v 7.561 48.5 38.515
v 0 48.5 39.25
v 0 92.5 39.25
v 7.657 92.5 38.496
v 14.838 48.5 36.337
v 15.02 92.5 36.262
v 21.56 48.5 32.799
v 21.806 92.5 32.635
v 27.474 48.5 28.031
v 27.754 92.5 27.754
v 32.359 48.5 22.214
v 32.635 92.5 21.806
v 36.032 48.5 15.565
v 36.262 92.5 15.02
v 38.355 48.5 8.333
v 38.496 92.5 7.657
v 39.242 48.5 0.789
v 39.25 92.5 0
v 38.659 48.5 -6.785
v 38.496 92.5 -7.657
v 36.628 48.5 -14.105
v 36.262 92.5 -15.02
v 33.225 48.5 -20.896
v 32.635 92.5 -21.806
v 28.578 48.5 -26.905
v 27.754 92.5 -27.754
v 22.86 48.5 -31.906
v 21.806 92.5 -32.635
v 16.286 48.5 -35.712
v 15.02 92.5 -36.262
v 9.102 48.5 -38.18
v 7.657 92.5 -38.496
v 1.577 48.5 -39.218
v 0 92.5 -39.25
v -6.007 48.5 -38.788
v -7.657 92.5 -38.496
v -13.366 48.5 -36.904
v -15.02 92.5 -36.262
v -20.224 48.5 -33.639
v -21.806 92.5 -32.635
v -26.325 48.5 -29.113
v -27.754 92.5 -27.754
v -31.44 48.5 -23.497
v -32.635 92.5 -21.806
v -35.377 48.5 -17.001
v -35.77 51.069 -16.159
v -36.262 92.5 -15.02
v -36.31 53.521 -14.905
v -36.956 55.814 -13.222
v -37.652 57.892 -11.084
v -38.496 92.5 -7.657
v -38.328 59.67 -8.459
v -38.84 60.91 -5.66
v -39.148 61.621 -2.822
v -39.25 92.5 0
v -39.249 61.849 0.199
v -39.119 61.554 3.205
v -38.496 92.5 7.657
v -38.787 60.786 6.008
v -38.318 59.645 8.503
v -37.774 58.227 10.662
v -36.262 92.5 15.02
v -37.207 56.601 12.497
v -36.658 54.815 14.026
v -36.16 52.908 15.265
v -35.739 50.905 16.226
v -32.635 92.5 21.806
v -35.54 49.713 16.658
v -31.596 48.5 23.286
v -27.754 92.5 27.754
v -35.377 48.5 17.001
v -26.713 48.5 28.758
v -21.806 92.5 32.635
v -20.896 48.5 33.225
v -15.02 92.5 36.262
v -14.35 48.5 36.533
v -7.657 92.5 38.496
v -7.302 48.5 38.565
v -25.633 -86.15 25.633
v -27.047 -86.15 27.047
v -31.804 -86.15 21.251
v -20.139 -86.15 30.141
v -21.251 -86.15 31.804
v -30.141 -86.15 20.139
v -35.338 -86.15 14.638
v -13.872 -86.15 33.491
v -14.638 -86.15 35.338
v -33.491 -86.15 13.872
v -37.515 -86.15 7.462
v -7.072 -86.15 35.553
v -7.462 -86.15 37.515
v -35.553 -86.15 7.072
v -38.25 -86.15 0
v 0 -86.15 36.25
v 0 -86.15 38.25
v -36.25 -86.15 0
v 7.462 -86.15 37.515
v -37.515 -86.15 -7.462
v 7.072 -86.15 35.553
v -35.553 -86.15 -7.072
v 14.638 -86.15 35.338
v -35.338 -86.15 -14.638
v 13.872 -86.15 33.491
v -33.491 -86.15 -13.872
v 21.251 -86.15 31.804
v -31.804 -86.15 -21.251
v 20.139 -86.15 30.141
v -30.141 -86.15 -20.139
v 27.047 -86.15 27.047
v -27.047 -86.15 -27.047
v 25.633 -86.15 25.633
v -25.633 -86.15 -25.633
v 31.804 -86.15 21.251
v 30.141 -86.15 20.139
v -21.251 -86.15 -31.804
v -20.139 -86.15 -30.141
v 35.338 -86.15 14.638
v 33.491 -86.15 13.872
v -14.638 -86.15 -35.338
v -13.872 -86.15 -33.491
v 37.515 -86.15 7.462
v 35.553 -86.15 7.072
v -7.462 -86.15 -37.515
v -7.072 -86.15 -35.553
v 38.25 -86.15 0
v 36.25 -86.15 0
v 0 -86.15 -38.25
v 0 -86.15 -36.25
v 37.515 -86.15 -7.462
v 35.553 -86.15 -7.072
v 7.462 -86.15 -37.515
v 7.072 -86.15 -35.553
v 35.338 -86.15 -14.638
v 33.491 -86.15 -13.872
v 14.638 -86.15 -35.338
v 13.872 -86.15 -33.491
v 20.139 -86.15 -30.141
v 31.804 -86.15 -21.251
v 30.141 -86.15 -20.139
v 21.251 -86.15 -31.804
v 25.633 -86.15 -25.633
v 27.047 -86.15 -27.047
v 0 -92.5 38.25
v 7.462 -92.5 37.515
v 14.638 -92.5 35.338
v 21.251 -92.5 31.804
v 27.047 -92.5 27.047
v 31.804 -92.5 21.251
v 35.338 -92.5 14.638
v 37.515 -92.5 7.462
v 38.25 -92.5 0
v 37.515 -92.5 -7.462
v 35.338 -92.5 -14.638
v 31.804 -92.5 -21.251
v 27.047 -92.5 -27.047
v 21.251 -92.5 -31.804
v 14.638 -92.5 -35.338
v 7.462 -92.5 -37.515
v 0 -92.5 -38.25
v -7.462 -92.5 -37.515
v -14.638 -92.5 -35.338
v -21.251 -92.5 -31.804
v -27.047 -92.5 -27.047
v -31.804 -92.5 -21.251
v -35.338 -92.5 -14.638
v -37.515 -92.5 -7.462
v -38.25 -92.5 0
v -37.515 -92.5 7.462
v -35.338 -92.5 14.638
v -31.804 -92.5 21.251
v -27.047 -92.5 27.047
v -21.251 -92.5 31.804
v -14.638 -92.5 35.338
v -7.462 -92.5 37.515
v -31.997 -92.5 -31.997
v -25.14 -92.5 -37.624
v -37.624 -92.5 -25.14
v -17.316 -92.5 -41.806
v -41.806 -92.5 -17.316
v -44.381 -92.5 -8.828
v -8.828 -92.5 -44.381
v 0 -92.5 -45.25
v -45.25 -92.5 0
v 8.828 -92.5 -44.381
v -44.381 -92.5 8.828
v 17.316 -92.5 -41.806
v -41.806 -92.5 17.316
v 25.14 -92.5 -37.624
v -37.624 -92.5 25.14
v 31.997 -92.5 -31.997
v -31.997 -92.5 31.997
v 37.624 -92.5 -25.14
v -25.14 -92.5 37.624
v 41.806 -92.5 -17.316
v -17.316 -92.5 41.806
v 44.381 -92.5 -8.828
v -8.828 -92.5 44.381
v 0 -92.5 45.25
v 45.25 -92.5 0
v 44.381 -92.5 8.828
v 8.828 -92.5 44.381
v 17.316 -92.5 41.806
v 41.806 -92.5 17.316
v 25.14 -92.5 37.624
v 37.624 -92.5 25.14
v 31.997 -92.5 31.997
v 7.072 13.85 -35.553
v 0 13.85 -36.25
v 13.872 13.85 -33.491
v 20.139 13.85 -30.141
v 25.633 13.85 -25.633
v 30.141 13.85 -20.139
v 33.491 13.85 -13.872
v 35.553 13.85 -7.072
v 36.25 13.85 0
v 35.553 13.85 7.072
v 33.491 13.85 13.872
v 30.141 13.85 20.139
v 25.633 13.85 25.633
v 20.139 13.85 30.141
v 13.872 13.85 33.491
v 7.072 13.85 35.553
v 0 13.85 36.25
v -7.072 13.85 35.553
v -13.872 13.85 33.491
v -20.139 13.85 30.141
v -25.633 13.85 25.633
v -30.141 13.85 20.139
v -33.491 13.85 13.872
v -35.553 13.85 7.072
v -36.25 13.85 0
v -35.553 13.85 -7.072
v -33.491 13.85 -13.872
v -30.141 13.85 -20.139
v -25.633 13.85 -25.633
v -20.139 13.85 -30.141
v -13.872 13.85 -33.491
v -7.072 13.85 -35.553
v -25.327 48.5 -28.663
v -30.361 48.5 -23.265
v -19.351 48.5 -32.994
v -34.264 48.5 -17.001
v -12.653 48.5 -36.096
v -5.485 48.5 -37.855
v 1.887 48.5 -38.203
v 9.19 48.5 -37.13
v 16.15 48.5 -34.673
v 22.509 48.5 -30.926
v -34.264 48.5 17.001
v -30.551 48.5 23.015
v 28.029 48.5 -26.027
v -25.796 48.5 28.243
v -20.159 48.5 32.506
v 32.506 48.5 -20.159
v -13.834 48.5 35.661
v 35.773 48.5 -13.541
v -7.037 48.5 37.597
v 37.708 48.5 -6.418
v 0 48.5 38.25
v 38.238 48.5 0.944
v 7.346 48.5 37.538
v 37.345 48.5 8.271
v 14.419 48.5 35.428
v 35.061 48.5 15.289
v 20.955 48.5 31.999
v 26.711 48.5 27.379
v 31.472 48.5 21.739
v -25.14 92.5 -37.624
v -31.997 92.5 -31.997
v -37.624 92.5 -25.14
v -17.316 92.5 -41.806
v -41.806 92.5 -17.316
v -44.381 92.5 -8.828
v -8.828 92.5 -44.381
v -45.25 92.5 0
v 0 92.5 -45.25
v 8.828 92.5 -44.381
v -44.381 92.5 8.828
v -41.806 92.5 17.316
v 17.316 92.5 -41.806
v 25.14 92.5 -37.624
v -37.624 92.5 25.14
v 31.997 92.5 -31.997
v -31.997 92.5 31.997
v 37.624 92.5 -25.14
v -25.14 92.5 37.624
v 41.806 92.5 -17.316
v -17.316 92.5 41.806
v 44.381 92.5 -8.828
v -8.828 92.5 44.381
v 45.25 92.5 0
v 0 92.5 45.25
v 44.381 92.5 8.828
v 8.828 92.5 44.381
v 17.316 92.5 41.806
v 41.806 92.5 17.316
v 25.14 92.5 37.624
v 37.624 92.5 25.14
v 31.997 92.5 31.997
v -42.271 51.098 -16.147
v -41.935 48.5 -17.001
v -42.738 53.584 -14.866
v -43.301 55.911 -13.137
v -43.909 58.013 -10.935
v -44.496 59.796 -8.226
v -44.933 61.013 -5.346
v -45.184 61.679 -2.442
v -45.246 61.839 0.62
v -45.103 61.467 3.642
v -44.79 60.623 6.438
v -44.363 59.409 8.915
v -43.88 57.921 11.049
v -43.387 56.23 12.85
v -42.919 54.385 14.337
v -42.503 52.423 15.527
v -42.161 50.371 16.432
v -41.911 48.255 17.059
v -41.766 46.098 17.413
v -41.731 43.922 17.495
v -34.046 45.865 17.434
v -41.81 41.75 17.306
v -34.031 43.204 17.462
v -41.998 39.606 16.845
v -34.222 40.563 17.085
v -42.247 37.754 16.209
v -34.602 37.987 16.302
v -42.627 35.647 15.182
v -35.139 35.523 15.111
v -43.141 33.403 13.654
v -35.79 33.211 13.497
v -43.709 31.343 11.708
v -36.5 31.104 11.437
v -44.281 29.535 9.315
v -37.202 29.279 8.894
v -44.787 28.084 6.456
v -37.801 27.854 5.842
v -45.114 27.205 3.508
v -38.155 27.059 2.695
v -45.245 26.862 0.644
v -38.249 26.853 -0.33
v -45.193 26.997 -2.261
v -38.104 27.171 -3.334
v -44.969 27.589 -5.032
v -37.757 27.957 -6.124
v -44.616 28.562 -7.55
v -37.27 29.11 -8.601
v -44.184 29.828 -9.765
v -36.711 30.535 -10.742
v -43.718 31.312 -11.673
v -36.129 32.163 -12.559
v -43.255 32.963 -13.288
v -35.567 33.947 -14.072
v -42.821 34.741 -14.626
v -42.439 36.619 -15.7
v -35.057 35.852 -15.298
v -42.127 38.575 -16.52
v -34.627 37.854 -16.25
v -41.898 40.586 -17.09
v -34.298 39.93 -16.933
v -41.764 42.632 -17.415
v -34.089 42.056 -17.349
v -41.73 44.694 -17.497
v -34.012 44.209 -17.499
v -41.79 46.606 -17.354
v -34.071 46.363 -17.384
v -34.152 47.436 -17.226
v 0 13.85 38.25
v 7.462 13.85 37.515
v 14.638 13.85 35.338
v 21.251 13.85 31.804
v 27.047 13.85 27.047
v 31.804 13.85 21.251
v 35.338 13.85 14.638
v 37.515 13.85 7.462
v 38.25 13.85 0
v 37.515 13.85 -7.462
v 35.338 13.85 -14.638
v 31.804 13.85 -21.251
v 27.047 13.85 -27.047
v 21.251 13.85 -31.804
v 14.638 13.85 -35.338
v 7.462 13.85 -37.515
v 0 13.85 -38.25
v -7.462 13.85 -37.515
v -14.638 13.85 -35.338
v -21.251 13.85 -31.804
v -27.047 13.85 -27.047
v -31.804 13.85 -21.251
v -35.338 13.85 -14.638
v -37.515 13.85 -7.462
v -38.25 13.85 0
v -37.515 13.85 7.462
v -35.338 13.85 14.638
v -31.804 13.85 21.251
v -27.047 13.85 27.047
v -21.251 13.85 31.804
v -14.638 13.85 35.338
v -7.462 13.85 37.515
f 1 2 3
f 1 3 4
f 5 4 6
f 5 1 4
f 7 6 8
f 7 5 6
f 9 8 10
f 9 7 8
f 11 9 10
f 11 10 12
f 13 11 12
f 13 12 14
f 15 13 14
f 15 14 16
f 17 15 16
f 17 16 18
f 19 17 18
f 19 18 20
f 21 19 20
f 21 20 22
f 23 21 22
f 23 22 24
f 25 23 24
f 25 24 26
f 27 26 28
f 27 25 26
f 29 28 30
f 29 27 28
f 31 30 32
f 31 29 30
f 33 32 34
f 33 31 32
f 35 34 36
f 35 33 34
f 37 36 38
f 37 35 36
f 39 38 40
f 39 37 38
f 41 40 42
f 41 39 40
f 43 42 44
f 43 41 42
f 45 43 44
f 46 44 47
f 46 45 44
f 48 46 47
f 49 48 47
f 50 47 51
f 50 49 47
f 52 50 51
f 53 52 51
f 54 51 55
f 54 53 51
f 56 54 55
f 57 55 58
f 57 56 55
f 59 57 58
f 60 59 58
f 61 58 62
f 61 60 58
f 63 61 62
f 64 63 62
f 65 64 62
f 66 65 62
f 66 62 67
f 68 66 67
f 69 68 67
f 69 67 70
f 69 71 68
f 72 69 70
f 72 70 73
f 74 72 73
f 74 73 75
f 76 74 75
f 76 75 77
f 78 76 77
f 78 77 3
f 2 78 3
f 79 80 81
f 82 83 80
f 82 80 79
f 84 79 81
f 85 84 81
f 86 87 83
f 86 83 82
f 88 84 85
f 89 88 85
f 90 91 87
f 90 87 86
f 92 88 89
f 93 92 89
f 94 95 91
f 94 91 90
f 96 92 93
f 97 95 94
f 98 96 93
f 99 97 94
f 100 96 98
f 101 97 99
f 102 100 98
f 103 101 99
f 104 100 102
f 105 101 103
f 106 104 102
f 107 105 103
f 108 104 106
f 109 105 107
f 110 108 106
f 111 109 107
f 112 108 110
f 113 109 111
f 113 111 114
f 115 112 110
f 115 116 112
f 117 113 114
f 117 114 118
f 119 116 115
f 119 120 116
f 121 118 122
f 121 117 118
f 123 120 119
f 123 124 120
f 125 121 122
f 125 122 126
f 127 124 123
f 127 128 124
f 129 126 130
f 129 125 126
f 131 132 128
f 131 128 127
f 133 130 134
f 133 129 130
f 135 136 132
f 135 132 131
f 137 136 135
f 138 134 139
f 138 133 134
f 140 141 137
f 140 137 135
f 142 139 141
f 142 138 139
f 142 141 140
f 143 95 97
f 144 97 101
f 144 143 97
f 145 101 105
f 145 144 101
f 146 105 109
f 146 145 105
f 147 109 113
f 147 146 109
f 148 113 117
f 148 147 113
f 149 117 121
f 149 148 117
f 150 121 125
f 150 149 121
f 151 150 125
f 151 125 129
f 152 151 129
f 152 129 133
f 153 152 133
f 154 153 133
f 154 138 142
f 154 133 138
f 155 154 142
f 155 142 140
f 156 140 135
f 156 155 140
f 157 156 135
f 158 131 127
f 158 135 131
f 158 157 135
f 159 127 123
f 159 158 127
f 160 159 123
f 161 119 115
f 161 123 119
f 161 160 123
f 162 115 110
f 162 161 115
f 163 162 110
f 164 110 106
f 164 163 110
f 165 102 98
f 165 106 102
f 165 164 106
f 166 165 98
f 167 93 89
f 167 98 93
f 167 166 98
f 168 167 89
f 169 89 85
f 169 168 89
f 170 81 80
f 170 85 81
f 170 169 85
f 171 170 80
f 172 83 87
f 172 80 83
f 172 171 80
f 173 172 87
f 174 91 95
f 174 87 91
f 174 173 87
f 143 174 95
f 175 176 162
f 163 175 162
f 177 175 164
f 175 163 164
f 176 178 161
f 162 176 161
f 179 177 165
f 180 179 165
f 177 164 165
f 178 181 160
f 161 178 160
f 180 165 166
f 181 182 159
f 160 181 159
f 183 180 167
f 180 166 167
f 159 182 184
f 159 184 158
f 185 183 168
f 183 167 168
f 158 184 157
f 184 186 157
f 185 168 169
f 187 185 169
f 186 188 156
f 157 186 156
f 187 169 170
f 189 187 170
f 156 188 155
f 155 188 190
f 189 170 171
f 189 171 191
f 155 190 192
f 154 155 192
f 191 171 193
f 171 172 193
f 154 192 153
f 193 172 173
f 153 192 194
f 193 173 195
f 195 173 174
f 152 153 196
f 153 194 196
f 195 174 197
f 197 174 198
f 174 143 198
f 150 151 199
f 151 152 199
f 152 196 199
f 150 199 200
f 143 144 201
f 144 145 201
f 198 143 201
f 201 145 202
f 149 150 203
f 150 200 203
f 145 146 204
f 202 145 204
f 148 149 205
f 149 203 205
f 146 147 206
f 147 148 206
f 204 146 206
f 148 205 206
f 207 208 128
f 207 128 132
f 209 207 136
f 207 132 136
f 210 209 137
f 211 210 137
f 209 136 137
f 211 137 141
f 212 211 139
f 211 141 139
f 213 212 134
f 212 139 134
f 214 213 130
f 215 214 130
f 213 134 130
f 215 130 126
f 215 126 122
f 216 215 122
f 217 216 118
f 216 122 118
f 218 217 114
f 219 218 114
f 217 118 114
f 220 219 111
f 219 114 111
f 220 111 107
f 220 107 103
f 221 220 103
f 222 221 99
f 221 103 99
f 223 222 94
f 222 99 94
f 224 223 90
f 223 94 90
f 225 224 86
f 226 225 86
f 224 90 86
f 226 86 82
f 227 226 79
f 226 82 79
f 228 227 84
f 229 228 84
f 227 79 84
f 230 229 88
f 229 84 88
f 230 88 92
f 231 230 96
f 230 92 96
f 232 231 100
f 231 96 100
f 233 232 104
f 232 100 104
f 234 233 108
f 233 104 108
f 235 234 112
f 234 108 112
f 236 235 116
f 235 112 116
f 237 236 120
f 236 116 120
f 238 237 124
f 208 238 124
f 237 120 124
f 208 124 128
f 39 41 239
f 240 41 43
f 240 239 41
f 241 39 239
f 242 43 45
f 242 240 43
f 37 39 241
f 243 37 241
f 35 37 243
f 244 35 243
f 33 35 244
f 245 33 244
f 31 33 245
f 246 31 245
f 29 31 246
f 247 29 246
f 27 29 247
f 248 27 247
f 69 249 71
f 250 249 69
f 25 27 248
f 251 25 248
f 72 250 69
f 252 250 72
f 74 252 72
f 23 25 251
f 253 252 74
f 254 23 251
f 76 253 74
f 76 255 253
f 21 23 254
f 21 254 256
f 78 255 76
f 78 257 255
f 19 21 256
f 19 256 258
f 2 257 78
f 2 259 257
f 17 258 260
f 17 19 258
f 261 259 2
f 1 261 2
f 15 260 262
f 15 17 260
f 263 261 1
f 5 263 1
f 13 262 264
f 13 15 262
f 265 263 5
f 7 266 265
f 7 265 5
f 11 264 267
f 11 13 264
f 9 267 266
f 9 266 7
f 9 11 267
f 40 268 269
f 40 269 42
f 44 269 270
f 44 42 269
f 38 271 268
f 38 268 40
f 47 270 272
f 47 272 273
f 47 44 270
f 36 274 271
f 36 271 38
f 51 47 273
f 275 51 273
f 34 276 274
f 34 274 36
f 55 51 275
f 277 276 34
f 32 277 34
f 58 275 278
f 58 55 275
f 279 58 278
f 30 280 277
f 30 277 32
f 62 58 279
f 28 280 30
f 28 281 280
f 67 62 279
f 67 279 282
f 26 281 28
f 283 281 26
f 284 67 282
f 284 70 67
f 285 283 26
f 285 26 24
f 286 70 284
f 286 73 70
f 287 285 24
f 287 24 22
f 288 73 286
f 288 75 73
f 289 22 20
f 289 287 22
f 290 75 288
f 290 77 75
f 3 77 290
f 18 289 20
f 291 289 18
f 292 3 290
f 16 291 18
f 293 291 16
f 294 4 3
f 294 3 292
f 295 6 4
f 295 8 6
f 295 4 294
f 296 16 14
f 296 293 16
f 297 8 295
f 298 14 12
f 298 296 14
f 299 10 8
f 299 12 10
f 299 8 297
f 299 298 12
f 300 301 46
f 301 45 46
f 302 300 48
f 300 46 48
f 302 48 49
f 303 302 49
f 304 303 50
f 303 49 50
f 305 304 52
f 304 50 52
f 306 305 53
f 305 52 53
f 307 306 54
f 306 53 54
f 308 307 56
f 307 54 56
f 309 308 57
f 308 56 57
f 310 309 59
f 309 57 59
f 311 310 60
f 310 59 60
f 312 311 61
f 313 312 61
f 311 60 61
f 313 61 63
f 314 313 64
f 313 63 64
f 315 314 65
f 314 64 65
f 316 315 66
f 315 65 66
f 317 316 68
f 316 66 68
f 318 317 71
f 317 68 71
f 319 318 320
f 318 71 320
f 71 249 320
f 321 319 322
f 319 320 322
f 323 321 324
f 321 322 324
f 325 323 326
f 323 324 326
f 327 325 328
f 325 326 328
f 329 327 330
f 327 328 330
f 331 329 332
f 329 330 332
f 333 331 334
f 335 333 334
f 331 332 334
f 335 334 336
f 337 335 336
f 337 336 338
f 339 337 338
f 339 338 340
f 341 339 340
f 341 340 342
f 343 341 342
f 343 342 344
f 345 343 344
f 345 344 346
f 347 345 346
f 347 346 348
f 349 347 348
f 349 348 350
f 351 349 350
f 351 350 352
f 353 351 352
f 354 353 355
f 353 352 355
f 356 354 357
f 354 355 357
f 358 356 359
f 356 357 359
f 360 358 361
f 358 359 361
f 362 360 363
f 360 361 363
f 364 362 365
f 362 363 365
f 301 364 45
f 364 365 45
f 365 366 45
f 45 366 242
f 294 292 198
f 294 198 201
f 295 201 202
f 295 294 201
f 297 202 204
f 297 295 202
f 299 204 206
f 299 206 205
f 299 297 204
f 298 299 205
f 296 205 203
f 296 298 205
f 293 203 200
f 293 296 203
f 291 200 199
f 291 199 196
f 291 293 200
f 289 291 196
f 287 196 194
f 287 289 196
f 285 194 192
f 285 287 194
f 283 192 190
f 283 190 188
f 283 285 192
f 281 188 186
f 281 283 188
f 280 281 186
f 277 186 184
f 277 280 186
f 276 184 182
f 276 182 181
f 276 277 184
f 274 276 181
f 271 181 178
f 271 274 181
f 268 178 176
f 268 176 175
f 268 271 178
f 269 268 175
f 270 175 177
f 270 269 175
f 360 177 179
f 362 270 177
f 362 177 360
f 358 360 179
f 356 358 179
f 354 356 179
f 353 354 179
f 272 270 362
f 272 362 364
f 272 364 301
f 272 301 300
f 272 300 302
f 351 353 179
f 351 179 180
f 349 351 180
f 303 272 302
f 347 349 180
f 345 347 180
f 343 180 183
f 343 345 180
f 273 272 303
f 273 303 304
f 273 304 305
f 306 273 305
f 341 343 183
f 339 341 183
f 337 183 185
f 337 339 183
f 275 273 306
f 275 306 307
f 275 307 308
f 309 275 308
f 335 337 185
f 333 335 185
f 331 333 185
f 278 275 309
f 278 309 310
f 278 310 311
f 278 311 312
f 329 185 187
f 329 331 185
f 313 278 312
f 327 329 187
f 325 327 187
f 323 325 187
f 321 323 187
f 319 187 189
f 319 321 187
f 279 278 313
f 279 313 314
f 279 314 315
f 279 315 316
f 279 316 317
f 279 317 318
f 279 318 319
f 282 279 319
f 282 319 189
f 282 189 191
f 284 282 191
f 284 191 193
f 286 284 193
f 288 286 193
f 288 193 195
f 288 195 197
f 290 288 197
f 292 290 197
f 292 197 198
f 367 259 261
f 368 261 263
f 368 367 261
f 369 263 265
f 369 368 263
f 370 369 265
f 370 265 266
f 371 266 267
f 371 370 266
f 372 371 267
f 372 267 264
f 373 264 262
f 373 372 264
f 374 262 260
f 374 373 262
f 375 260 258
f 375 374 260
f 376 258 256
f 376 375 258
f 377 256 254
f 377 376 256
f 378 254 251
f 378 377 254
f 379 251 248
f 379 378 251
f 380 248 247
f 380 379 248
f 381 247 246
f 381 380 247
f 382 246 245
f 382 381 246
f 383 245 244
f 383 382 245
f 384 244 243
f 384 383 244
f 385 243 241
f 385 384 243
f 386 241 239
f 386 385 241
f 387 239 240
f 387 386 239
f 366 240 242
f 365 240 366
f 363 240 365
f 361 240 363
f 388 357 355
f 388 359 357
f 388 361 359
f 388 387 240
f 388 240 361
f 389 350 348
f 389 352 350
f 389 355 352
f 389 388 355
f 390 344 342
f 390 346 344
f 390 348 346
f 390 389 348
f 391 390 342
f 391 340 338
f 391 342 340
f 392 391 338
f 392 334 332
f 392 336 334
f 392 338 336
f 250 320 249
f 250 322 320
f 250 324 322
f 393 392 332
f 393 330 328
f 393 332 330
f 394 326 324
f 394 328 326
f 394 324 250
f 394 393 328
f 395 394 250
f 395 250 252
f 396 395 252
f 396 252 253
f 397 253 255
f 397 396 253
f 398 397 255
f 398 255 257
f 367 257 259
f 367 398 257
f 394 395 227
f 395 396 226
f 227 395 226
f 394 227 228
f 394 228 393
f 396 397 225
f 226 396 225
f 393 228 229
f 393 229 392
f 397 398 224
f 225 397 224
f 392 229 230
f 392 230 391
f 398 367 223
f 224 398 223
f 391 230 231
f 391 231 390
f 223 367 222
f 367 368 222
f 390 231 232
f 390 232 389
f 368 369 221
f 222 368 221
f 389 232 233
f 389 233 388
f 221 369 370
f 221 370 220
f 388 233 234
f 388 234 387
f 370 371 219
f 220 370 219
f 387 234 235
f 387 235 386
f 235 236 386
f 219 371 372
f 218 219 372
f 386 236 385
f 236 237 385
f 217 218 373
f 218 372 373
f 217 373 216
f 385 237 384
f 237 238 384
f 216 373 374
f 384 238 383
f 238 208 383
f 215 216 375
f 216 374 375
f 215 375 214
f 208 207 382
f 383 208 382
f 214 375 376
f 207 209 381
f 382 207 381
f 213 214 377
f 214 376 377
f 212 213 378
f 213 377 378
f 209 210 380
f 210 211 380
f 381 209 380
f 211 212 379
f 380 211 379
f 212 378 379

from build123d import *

# Parameters (mm, degrees)
SKETCH1_R           = 45.25
SKETCH1_R_2         = 38.25
BOSS_EXTRUDE1_DEPTH = 92.5
BOSS_EXTRUDE2_START = -6.35
SKETCH2_R           = 38.25
SKETCH2_R_2         = 36.25
BOSS_EXTRUDE2_DEPTH = 100
CUT_EXTRUDE3_START  = -44
SKETCH6_R           = 39.25
SKETCH6_R_2         = 38.25
CUT_EXTRUDE3_DEPTH  = 44
SKETCH7_R           = 17.5
CUT_EXTRUDE4_DEPTH  = 113.478331247


with BuildPart() as part:
    # Sketch1 → Boss-Extrude1 (new, symmetric)
    with BuildSketch(Plane(origin=(0, 0, 0), x_dir=(1, 0, 0), z_dir=(0, 1, 0))):
        with Locations(Location((0, 0, 0), (0, 0, 270))):
            Circle(SKETCH1_R)
        with Locations(Location((0, 0, 0), (0, 0, 270))):
            Circle(SKETCH1_R_2, mode=Mode.SUBTRACT)
    extrude(amount=BOSS_EXTRUDE1_DEPTH, both=True)

    # Sketch2 → Boss-Extrude2 (add)
    with BuildSketch(Plane.XZ.offset(92.5).offset(BOSS_EXTRUDE2_START)):
        with Locations(Location((0, 0, 0), (0, 0, 270))):
            Circle(SKETCH2_R)
        with Locations(Location((0, 0, 0), (0, 0, 270))):
            Circle(SKETCH2_R_2, mode=Mode.SUBTRACT)
    extrude(amount=-BOSS_EXTRUDE2_DEPTH)

    # Sketch6 → Cut-Extrude3 (cut)
    with BuildSketch(Plane(origin=(0, 92.5, 0), x_dir=(1, 0, 0), z_dir=(0, 1, 0)).offset(CUT_EXTRUDE3_START)):
        with Locations(Location((0, 0, 0), (0, 0, 270))):
            Circle(SKETCH6_R)
        with Locations(Location((0, 0, 0), (0, 0, 90))):
            Circle(SKETCH6_R_2, mode=Mode.SUBTRACT)
    extrude(amount=CUT_EXTRUDE3_DEPTH, mode=Mode.SUBTRACT)

    # Sketch7 → Cut-Extrude4 (cut, through all)
    with BuildSketch(Plane(origin=(0, 0, 0), x_dir=(0, 0, -1), z_dir=(1, 0, 0))):
        with Locations(Location((0, 44.35, 0), (0, 0, 13.717970606))):
            Circle(SKETCH7_R)
    extrude(amount=-CUT_EXTRUDE4_DEPTH, mode=Mode.SUBTRACT)


solid = part.part
